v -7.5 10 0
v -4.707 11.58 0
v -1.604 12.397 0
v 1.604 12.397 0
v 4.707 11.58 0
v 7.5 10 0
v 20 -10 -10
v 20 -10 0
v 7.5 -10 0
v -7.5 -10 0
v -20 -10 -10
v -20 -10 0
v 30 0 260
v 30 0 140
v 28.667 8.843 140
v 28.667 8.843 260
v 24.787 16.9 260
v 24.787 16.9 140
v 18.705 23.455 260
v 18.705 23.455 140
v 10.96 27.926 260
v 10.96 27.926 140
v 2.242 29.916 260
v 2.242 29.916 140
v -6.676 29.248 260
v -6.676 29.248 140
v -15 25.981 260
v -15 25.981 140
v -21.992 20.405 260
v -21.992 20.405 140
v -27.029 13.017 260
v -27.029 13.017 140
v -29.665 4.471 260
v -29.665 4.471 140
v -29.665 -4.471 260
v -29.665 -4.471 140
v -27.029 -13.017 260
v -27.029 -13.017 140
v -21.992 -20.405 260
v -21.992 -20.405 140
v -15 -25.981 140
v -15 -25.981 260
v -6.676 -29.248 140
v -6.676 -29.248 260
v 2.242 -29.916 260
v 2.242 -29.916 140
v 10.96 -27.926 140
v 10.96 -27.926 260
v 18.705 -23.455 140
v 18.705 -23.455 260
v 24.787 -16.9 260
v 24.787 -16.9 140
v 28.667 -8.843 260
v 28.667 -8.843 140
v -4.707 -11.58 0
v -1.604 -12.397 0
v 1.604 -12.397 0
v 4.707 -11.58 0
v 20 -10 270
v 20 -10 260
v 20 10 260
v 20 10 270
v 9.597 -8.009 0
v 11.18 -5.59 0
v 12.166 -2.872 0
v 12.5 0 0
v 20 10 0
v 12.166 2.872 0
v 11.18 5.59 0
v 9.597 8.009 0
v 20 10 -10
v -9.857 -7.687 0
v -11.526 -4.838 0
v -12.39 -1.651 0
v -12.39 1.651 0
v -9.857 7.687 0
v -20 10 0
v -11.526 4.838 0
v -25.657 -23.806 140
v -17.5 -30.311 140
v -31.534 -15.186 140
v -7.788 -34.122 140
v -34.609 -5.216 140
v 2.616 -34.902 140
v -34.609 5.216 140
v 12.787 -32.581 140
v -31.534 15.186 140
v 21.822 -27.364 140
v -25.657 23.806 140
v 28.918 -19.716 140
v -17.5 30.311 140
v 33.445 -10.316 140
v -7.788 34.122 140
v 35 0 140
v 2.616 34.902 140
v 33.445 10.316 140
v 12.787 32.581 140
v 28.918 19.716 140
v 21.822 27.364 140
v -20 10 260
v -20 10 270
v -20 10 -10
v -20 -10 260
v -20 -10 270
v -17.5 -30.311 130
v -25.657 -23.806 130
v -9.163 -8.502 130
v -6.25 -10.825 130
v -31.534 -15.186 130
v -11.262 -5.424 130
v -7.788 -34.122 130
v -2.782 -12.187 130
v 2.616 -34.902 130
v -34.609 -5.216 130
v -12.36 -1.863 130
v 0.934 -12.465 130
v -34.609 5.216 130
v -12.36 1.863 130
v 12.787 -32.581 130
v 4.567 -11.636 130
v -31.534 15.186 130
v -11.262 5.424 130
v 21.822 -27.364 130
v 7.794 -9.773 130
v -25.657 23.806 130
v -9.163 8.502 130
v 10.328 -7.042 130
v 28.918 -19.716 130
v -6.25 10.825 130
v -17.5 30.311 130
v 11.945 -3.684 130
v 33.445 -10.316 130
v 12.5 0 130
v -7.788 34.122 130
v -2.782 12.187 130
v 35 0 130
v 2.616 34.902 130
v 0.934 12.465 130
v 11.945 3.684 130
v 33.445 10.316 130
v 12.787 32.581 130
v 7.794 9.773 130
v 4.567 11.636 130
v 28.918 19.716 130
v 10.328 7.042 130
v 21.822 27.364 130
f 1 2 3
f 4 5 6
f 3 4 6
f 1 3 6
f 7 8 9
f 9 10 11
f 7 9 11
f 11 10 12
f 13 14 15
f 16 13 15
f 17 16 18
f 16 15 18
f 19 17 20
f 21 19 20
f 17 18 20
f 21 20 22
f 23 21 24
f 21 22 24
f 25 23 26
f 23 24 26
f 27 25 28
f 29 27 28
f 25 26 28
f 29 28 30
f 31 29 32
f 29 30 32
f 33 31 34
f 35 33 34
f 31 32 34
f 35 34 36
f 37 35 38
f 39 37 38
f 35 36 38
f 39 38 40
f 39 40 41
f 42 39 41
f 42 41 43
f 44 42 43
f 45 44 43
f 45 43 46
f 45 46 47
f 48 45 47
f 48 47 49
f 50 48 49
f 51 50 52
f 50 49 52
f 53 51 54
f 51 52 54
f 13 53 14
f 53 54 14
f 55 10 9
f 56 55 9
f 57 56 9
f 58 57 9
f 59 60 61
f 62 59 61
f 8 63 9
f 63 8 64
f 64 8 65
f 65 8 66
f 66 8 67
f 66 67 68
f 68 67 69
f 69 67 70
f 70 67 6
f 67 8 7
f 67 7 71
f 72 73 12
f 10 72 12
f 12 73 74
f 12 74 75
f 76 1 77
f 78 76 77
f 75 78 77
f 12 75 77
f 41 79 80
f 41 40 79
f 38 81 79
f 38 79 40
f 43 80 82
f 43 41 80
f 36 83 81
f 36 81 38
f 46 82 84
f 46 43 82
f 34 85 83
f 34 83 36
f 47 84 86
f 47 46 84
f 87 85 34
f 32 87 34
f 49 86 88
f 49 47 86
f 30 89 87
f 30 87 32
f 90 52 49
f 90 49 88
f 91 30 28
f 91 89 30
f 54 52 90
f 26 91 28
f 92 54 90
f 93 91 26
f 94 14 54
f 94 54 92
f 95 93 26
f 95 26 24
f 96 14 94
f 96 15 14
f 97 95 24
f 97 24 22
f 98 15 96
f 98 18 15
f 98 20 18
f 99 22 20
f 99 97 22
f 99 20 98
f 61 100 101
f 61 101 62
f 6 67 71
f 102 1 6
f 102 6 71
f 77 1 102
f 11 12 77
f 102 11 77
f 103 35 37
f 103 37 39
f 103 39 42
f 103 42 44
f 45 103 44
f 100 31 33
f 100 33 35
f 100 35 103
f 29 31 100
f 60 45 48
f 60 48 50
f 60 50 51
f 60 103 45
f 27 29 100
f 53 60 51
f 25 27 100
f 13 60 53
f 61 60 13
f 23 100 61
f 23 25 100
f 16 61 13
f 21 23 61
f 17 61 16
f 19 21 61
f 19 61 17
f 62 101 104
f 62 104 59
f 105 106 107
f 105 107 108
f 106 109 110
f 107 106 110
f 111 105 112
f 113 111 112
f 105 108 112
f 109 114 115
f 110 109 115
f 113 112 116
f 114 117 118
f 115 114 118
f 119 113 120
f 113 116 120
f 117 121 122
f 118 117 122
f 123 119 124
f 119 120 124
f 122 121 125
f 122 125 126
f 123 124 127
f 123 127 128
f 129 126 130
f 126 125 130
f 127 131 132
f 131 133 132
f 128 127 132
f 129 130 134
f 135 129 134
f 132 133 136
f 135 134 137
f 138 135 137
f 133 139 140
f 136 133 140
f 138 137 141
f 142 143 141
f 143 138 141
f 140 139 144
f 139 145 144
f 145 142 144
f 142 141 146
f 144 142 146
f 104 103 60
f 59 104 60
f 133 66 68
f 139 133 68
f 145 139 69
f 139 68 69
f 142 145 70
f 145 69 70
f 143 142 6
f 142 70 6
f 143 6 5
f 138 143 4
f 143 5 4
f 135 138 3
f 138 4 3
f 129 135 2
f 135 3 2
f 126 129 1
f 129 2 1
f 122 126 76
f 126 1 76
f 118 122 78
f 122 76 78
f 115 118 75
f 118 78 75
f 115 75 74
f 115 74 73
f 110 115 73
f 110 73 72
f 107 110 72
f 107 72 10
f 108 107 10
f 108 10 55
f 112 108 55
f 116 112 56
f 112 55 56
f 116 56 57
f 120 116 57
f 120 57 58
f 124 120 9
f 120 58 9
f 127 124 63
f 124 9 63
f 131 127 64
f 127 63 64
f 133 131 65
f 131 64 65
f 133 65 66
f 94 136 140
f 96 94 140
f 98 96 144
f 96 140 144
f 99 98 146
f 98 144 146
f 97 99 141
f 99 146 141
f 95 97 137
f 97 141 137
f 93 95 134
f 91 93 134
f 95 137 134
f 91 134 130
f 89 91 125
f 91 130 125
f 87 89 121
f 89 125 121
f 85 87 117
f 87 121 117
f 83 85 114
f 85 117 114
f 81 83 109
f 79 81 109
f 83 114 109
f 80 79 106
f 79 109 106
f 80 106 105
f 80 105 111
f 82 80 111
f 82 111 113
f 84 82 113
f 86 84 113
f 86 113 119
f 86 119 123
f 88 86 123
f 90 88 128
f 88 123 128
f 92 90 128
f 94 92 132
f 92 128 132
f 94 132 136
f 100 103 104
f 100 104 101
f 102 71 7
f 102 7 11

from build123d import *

# Parameters (mm, degrees)
SKETCH1_R           = 12.5
BOSS_EXTRUDE1_DEPTH = 130
SKETCH2_R           = 35
BOSS_EXTRUDE2_DEPTH = 10
SKETCH3_R           = 30
BOSS_EXTRUDE3_DEPTH = 120
SKETCH4_W           = 40
SKETCH4_H           = 20
BOSS_EXTRUDE4_DEPTH = 10
SCHIZZO1_W          = 40
SCHIZZO1_H          = 20
BOSS_EXTRUDE5_DEPTH = 10


with BuildPart() as part:
    # Sketch1 → Boss-Extrude1 (new body)
    with BuildSketch(Plane.XY):
        Circle(SKETCH1_R)
    extrude(amount=BOSS_EXTRUDE1_DEPTH)

    # Sketch2 → Boss-Extrude2 (add)
    with BuildSketch(Plane.XY.offset(130)):
        Circle(SKETCH2_R)
    extrude(amount=BOSS_EXTRUDE2_DEPTH)

    # Sketch3 → Boss-Extrude3 (add)
    with BuildSketch(Plane.XY.offset(140)):
        Circle(SKETCH3_R)
    extrude(amount=BOSS_EXTRUDE3_DEPTH)

    # Sketch4 → Boss-Extrude4 (add)
    with BuildSketch(Plane(origin=(0, 0, 0), x_dir=(-1, 0, 0), z_dir=(0, 0, -1))):
        Rectangle(SKETCH4_W, SKETCH4_H)
    extrude(amount=BOSS_EXTRUDE4_DEPTH)

    # Schizzo1 → Boss-Extrude5 (add)
    with BuildSketch(Plane.XY.offset(260)):
        Rectangle(SCHIZZO1_W, SCHIZZO1_H)
    extrude(amount=BOSS_EXTRUDE5_DEPTH)


solid = part.part
